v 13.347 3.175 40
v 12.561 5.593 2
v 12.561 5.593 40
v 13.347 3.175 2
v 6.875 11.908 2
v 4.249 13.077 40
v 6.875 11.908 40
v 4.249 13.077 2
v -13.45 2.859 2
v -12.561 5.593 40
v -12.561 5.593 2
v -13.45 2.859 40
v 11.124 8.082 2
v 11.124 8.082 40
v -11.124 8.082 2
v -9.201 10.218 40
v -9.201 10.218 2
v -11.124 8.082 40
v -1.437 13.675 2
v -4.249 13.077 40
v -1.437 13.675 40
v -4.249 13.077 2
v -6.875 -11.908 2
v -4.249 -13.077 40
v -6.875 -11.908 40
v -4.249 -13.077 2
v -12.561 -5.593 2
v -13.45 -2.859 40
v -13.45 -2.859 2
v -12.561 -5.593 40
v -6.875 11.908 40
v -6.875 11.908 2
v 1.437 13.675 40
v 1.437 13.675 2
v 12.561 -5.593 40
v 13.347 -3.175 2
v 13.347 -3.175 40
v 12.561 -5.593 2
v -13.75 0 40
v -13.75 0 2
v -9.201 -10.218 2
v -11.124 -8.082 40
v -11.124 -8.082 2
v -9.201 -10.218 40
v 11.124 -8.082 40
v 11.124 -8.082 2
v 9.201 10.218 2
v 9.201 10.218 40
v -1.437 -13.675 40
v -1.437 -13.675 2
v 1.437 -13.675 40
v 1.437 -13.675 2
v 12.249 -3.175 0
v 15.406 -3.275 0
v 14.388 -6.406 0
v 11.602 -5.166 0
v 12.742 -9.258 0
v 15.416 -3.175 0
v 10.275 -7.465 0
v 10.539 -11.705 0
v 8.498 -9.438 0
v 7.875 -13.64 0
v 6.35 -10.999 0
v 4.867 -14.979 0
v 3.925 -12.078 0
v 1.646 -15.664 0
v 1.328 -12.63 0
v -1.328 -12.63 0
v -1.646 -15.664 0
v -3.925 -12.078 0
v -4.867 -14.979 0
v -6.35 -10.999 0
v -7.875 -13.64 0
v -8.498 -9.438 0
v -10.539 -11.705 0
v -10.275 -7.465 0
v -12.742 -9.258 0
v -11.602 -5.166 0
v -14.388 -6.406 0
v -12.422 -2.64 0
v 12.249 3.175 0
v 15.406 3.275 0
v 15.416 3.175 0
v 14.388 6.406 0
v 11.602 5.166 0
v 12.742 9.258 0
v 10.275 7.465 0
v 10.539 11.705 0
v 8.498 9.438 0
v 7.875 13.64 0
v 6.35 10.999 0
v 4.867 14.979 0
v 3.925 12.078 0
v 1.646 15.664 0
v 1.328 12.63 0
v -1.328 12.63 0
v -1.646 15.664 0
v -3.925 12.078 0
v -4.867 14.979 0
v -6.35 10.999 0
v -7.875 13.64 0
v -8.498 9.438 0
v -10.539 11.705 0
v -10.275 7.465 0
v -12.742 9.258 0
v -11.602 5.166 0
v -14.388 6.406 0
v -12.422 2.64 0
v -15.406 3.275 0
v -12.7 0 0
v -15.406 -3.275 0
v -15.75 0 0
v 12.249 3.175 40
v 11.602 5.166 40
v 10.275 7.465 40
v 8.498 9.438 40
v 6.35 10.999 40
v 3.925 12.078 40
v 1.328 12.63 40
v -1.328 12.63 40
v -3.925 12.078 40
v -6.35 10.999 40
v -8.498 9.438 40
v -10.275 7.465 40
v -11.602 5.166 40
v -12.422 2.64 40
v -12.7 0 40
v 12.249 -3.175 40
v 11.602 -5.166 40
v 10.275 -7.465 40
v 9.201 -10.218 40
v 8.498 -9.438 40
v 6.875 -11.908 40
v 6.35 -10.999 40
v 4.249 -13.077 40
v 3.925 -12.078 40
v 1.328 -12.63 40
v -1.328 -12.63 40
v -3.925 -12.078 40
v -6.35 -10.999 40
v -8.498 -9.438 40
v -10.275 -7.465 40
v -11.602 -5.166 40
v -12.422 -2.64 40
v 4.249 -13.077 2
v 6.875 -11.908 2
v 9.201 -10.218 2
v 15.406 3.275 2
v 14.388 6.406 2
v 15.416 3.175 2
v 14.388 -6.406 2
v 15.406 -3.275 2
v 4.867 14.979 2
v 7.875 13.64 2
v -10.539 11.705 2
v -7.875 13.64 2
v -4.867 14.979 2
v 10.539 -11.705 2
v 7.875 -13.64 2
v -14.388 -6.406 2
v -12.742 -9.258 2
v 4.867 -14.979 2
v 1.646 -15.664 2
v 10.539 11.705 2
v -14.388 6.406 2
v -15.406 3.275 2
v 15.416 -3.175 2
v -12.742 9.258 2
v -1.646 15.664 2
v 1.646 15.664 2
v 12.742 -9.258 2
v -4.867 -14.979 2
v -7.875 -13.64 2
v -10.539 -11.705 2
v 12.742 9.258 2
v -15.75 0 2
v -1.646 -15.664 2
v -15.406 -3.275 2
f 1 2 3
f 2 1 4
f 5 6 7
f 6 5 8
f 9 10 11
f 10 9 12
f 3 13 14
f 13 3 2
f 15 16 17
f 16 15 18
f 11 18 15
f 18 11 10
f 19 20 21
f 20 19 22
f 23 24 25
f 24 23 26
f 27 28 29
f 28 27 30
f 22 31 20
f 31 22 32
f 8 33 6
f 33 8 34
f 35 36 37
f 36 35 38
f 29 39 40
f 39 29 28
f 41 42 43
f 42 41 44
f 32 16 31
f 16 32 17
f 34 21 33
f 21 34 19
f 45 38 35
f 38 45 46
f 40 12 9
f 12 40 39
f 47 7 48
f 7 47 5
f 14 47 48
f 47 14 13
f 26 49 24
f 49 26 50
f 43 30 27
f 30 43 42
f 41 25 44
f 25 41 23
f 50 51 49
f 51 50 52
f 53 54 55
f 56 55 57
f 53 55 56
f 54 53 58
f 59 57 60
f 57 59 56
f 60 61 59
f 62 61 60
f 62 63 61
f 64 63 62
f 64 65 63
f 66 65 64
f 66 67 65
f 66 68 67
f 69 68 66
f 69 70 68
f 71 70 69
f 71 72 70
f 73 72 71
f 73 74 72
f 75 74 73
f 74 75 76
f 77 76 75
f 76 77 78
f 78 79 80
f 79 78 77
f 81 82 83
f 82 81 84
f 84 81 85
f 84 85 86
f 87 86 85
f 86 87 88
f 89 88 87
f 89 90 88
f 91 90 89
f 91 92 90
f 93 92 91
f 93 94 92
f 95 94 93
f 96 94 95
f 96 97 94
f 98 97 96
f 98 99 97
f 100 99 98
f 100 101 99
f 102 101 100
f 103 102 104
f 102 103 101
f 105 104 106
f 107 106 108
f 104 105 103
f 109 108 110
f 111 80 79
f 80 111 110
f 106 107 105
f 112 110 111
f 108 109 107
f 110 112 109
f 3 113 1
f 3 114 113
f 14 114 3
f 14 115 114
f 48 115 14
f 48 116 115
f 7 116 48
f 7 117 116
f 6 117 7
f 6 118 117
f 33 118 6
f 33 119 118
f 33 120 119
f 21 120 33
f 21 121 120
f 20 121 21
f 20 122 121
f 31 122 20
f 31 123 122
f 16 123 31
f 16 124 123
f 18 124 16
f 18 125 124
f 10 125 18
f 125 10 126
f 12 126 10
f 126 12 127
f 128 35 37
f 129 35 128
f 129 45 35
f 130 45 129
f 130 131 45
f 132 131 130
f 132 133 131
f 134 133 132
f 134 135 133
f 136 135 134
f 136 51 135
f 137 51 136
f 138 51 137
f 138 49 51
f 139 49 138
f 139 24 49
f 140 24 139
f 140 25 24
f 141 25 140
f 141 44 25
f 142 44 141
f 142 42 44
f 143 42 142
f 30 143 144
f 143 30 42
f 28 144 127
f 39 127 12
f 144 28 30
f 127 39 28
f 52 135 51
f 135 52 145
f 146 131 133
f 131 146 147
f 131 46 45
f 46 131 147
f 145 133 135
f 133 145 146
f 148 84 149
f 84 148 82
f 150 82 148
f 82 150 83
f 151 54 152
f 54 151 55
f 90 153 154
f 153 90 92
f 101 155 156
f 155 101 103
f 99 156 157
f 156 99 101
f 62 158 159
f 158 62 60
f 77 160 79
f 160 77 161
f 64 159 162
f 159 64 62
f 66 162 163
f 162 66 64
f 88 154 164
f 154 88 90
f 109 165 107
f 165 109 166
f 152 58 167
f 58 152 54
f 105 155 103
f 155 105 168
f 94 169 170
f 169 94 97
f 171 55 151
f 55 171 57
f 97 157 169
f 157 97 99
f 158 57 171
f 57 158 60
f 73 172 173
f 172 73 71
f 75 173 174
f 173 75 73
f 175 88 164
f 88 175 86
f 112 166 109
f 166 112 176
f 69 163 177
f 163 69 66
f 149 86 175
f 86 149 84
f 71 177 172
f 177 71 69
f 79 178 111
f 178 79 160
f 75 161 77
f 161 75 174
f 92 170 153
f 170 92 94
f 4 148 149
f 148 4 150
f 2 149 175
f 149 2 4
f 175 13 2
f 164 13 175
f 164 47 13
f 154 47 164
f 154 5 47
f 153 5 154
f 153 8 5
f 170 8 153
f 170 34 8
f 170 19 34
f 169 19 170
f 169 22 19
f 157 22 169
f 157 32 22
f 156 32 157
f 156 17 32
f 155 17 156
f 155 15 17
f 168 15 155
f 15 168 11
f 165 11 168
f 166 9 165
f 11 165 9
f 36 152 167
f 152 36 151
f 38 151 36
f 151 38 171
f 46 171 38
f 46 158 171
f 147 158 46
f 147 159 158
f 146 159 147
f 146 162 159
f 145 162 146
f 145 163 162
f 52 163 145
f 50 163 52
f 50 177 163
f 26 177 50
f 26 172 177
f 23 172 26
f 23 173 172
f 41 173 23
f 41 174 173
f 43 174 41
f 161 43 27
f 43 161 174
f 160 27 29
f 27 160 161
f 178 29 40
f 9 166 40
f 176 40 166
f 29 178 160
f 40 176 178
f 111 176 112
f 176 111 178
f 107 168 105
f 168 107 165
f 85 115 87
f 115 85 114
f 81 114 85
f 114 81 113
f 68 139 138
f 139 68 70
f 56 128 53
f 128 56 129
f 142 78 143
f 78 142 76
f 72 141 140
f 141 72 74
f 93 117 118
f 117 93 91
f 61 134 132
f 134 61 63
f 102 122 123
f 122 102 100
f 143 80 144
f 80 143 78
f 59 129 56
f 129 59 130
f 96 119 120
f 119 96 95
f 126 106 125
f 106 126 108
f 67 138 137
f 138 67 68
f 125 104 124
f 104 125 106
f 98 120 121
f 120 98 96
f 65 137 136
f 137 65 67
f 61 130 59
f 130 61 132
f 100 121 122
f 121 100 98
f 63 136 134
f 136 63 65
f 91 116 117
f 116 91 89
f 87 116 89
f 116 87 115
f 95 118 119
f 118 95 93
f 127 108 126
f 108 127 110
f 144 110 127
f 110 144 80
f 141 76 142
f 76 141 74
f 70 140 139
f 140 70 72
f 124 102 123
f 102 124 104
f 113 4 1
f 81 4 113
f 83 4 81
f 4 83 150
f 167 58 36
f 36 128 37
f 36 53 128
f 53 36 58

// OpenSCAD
// Customizable tube collar
// Created by Kjell Kernen
// Date 14.9.2015

/*[Colar Parameters]*/
// of the collar in tens of mm:
inner_diameter=254;       // [20:1000]

// of the collar in tens of mm:
outer_diameter=275;      // [30:1010]

// of the collar in tens of mm:
total_height=400;       // [30:1000]

// of the flange in tens of mm:
flange_height=20;// [10:100]

// of the flange in tens of mm:
flange_width=40;// [10:100]

/*[Hidden]*/


difference()
{
    difference()
    {
        union()
        {
            cylinder(r=(outer_diameter/20), h=total_height/10);	
            cylinder(r=((outer_diameter + flange_width)/20), h=flange_height/10);	
        }
        translate([0,0,-1])
            cylinder(r=(inner_diameter/20), h=(total_height/10) + 2);	
    }
    translate([0,-inner_diameter/80,-1]) 
        cube(size=[(inner_diameter + flange_width + 100 ) /20, inner_diameter/40 , total_height/10 + 2]);
}
